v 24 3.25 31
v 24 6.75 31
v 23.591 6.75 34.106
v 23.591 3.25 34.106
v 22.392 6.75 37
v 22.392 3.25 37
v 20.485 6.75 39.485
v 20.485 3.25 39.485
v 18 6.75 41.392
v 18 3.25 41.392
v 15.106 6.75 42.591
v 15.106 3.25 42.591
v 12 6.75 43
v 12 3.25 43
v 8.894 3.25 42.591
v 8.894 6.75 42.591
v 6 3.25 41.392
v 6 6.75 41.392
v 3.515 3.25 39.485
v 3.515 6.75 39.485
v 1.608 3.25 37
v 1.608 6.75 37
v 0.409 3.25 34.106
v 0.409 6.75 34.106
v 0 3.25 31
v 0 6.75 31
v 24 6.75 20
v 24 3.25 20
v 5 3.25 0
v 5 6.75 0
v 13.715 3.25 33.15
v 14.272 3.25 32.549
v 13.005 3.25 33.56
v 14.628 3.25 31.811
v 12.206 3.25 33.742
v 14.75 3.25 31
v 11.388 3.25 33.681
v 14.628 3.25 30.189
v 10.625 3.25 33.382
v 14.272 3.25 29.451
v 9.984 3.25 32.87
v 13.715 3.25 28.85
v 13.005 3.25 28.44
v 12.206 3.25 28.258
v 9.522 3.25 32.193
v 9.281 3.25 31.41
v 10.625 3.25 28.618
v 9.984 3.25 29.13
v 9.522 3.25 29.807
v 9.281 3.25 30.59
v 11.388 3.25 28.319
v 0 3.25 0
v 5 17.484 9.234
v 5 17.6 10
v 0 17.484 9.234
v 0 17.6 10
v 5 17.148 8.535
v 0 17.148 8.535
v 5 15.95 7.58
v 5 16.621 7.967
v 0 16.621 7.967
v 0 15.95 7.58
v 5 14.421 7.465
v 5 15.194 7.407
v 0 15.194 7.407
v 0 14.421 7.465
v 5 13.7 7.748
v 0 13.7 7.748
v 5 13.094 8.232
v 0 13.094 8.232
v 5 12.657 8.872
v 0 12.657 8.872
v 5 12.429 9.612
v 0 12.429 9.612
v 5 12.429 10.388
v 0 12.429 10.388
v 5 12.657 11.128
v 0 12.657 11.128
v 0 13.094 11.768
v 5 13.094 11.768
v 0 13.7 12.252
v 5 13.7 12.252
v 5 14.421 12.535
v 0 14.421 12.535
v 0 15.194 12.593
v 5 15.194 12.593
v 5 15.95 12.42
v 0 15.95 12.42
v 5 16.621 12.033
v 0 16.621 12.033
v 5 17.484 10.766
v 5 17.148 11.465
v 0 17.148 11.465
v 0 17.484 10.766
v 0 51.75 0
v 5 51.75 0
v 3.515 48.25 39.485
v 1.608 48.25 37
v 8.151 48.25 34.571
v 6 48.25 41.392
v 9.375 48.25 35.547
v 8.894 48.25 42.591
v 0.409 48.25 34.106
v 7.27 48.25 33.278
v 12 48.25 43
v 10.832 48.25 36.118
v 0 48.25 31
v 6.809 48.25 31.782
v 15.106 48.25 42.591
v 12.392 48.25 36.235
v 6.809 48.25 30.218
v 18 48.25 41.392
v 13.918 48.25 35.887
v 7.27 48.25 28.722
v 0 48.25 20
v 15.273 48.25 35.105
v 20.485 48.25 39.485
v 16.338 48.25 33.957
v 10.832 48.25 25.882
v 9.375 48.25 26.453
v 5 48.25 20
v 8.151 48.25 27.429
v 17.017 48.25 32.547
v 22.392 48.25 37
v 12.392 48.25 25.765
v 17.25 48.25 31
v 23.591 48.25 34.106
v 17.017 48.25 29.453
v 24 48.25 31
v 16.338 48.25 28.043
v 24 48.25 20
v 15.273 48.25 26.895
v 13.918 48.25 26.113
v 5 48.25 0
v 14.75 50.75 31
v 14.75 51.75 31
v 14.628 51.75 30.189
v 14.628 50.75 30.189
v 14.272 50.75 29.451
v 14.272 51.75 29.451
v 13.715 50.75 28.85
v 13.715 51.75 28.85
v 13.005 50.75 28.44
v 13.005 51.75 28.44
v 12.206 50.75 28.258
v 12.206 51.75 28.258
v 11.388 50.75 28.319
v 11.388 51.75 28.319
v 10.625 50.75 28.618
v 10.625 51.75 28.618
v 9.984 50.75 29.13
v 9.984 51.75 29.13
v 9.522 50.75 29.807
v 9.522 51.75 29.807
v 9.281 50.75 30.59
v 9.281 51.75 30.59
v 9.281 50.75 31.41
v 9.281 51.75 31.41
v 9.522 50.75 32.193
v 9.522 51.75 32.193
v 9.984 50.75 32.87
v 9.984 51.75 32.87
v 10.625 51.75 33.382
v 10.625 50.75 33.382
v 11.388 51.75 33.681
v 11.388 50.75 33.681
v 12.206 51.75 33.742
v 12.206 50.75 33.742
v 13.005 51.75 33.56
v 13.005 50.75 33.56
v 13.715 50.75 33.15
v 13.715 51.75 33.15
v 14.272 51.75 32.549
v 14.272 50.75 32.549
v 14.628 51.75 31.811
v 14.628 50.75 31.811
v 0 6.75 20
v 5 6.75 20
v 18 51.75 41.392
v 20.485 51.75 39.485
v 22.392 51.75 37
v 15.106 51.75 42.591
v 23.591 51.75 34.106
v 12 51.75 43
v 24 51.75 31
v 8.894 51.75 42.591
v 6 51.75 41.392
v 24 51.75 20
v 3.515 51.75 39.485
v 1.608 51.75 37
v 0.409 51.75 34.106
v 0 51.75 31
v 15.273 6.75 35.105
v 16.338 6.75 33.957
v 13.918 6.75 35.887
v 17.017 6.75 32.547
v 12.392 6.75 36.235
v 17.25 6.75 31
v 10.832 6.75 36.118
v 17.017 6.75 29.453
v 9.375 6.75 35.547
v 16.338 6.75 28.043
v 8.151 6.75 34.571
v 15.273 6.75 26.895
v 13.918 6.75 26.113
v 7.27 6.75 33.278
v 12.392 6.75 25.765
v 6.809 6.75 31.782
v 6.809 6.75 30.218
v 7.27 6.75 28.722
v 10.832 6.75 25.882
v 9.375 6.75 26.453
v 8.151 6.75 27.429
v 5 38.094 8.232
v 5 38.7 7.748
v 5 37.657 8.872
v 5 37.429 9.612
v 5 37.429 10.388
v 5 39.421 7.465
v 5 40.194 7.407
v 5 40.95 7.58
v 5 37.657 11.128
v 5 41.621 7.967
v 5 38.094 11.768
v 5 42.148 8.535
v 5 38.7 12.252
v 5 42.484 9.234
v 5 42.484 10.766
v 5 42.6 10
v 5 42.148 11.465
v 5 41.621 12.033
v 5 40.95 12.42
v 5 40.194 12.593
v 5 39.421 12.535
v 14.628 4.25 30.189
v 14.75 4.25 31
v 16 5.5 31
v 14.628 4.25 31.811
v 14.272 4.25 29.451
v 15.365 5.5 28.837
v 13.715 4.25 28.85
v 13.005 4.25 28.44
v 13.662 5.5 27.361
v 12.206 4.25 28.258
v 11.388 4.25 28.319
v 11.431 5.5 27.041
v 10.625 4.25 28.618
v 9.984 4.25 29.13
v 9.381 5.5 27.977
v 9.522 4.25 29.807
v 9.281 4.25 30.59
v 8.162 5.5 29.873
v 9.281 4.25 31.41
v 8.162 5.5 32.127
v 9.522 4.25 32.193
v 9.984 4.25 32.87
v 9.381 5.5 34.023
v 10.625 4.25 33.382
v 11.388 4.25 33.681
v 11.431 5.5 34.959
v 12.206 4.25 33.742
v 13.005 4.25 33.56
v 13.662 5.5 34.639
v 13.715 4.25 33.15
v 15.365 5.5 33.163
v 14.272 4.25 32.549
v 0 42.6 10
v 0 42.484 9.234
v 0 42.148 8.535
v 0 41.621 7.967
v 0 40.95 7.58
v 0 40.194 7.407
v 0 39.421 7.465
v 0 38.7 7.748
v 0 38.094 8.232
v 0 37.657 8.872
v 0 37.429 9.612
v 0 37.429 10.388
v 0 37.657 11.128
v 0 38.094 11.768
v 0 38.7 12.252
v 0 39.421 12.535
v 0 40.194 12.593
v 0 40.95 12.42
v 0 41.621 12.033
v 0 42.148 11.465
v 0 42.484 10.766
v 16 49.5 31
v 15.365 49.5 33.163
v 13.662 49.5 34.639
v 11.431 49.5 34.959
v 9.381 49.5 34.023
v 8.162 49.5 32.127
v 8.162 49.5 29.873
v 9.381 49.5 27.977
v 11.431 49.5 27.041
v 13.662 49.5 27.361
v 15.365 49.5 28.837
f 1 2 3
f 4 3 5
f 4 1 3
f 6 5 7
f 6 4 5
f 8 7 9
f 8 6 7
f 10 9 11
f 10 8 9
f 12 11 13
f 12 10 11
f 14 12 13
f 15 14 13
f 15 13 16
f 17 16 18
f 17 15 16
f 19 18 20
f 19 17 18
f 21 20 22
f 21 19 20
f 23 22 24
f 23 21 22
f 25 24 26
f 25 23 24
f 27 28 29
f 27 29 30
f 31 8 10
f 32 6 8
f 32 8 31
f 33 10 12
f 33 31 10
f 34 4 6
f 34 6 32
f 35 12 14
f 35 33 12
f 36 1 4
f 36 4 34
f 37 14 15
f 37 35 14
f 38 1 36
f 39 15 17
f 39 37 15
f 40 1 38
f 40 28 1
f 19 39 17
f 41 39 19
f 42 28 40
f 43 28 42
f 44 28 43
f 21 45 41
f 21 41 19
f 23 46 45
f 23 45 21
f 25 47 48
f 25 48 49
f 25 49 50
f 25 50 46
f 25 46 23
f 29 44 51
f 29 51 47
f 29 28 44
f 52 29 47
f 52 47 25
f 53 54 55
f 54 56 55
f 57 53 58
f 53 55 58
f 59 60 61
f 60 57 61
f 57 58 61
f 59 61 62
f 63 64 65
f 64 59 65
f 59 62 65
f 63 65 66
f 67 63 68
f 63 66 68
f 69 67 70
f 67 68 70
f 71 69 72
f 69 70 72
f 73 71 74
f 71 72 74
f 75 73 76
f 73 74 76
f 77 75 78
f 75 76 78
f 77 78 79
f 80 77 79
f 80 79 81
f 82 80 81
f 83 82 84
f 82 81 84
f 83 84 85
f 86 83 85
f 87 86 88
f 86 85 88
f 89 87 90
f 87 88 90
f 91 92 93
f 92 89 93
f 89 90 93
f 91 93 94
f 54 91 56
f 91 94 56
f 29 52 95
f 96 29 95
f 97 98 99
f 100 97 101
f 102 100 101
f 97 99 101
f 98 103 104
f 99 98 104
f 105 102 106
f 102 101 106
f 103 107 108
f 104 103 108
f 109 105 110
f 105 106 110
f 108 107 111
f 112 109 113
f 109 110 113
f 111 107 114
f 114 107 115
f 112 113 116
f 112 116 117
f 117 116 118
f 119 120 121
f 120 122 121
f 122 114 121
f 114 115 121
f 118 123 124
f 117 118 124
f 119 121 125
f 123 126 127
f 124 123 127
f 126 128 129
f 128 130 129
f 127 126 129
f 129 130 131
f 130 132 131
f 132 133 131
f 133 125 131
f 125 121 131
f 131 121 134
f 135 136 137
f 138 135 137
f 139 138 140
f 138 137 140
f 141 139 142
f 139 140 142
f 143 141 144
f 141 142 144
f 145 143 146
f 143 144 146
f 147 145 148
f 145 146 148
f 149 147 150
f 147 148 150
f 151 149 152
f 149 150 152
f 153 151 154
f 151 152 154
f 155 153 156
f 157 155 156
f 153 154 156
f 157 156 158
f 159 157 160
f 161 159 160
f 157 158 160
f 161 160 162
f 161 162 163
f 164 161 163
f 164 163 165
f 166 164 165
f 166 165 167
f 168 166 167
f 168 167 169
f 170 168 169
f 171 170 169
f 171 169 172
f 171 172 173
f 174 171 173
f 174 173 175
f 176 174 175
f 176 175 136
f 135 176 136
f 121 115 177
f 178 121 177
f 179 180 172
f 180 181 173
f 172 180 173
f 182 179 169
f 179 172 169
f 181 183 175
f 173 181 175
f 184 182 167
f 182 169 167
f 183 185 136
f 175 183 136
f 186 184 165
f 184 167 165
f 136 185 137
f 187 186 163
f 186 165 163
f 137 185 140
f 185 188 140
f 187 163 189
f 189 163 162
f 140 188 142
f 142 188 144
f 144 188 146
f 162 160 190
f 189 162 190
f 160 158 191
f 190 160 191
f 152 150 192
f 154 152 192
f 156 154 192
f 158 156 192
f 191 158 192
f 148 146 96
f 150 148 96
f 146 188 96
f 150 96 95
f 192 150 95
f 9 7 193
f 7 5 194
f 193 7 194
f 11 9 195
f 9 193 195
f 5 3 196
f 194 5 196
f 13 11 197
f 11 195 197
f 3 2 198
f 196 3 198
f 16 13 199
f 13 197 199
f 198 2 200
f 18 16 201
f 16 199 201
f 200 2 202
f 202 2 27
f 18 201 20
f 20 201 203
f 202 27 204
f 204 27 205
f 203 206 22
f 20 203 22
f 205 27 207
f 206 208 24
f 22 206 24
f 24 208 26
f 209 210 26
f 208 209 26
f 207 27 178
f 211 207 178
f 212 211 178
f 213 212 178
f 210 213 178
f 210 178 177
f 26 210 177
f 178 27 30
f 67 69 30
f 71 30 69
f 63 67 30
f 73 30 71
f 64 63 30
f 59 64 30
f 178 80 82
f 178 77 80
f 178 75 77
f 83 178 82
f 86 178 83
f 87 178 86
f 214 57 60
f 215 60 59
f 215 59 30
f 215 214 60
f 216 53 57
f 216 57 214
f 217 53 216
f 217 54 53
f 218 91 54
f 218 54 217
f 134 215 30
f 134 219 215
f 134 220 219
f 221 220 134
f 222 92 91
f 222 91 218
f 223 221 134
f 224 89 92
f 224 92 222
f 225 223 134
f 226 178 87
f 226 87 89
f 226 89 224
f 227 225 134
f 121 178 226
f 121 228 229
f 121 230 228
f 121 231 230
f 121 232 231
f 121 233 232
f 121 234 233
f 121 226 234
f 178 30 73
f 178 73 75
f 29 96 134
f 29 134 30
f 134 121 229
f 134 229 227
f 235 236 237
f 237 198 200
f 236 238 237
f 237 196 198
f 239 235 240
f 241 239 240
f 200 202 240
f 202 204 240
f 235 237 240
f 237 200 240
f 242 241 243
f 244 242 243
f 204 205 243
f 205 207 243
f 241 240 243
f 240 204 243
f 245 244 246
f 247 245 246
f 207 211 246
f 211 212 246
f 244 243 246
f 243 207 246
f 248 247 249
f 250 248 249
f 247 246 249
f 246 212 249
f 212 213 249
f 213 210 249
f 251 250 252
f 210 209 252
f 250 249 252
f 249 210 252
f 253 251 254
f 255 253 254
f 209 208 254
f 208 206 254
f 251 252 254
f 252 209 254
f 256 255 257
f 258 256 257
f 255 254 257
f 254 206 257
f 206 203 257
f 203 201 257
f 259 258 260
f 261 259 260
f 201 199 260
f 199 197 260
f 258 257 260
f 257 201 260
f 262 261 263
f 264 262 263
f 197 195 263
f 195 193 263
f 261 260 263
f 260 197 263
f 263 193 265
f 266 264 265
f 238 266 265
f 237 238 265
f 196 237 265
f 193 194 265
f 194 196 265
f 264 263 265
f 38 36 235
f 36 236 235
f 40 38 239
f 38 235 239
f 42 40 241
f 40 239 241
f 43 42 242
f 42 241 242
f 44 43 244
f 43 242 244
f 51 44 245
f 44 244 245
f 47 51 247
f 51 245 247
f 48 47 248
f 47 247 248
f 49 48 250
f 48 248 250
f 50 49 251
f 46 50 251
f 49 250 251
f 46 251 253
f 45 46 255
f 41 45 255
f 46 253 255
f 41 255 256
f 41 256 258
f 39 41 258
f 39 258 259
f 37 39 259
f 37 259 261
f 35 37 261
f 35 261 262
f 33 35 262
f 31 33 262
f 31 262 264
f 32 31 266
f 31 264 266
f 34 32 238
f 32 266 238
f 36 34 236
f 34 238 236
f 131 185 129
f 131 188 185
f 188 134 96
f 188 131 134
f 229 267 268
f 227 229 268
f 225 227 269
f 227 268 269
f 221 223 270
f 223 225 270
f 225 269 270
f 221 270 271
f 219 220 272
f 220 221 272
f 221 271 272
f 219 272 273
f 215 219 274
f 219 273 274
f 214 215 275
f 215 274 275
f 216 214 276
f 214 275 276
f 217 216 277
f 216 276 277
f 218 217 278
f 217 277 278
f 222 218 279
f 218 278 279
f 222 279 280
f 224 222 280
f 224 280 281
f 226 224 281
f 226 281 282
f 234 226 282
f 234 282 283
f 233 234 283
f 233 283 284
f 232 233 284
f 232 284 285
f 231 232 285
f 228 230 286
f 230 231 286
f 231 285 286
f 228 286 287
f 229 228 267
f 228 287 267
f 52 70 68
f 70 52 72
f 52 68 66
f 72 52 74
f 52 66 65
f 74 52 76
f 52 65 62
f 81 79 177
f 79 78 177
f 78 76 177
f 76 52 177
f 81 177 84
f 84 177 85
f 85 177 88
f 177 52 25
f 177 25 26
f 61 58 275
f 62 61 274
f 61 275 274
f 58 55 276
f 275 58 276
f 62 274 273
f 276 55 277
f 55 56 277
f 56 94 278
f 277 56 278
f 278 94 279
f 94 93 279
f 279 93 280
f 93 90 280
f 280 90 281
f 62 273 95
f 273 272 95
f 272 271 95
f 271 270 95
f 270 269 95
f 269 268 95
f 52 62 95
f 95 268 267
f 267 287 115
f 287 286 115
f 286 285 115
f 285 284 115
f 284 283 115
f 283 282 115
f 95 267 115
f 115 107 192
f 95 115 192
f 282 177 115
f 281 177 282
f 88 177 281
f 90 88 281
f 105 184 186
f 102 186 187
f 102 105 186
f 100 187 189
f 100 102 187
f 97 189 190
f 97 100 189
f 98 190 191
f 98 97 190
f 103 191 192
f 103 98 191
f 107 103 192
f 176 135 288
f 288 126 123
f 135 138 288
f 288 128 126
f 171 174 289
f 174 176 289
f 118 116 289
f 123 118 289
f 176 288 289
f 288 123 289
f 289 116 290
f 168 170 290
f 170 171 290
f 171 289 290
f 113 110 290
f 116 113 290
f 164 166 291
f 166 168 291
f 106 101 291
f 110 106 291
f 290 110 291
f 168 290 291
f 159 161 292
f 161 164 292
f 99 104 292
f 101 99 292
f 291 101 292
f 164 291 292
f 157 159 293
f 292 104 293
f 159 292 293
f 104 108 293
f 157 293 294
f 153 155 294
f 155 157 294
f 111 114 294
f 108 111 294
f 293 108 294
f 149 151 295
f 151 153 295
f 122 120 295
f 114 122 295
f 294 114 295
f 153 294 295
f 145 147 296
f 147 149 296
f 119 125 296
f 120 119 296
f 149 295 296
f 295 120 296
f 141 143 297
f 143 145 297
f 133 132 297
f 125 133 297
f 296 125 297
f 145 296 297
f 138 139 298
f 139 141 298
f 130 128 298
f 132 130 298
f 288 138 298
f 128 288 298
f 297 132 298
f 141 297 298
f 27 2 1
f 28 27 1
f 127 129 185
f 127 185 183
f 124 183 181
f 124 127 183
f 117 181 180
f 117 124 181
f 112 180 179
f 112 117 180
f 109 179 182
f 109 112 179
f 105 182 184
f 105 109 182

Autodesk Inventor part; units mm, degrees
ref_plane "YZ Plane" through (0, 0, 0) normal (1, 0, 0) x (0, 1, 0)
ref_plane "XZ Plane" through (0, 0, 0) normal (0, 1, 0) x (-1, 0, 0)
ref_plane "XY Plane" through (0, 0, 0) normal (0, 0, 1) x (1, 0, 0)
sketch "Sketch1" plane through (0, 0, 0) normal (1, 0, 0) x (0, 1, 0)
  line L0 (0, 0) -> (55, 0)
  line L1 (55, 0) -> (55, 20)
  line L2 (55, 20) -> (0, 20)
  line L3 (0, 20) -> (0, 0)
  line L4 (55, 10) -> (0, 10) construction
  circle A0 centre (40, 10) radius 2.6
  circle A1 centre (15, 10) radius 2.6
  dimension "d0" = 55
  dimension "d1" = 20
  dimension "d2" = 5.2
  dimension "d3" = 5.2
  dimension "d4" = 15
  dimension "d5" = 15
extrude "Extrusion1" add sketch "Sketch1" along normal blind 5
sketch "Sketch2" plane through (0, 0, 20) normal (0, 0, 1) x (1, 0, 0)
  line L0 (0, 48.25) -> (29, 48.25)
  line L1 (29, 48.25) -> (29, 55)
  line L2 (29, 55) -> (0, 55)
  line L3 (0, 55) -> (0, 48.25)
  line L4 (0, 0) -> (29, 0)
  line L5 (29, 0) -> (29, 6.75)
  line L6 (29, 6.75) -> (0, 6.75)
  line L7 (0, 6.75) -> (0, 0)
  line L8 (0, 55) -> (5, 55) projected
  line L9 (0, 0) -> (0, 55) projected
  line L10 (0, 55) -> (0, 0) projected
  line L11 (0, 0) -> (5, 0) projected
  line L12 (5, 55) -> (5, 0) projected
  line L13 (0, 55) -> (5, 55) projected
  line L14 (29, 55) -> (24, 55)
  line L15 (24, 55) -> (24, 0)
  line L16 (24, 0) -> (29, 0)
  line L17 (29, 0) -> (29, 55)
  point P0 (5, 48.25)
  point P1 (5, 6.75)
  point P2 (24, 6.75)
  point P3 (24, 48.25)
  dimension "d8" = 29
  dimension "d9" = 29
  dimension "d12" = 6.75
  dimension "d13" = 41.5
  dimension "d33" = 5
extrude "Extrusion2" add sketch "Sketch2" along normal blind 23 contours L3 L2 L12 L0 | L12 L2 L15 L0 | L6 L12 L4 L7 | L6 L15 L4 L12
fillet "Fillet1" radius 12 4 edges at (24, 51.625, 43) (0, 51.625, 43) (24, 3.375, 43) (0, 3.375, 43)
sketch "Sketch3" plane through (0, 55, 0) normal (0, 1, 0) x (1, 0, 0)
  circle A0 centre (12, -31) radius 2.75
  arc A1 (0, -31) -> (24, -31) centre (12, -31) ccw projected
  point P0 (0, 0)
  dimension "d17" = 5.5
extrude "Extrusion3" cut sketch "Sketch3" against normal through all
sketch "Sketch4" plane through (0, 0, 0) normal (0, 0, -1) x (-1, 0, 0)
  line L0 (0, 55) -> (-5, 55) projected
  line L1 (0, 55) -> (-29, 55)
  line L2 (-29, 55) -> (-29, 51.75)
  line L3 (-29, 51.75) -> (0, 51.75)
  line L4 (0, 51.75) -> (0, 55)
  line L5 (0, 6.75) -> (0, 0) projected
  line L6 (-29, 0) -> (-29, 6.75) projected
  line L7 (0, 0) -> (-29, 0)
  line L8 (-29, 0) -> (-29, 3.25)
  line L9 (-29, 3.25) -> (0, 3.25)
  line L10 (0, 3.25) -> (0, 0)
  dimension "d26" = 3.25
  dimension "d27" = 3.25
extrude "Extrusion4" cut sketch "Sketch4" against normal through all
chamfer "Chamfer3" distance 2.5 angle 45 2 edges at (9.25, 48.25, 31) (9.25, 6.75, 31)
chamfer "Chamfer4" distance 20 distance2 19 1 edges at (5, 50, 20) measured on face at (5, 23.6407, 2.523)
chamfer "Chamfer5" distance 20 distance2 19 1 edges at (5, 5, 20) measured on face at (5, 22.474, 2.523)
equation "\"d3\" = d2"
equation "\"d5\" = d4"
equation "\"d9\" = d8"
properties part number "Y Axis Drag Chain Mount Bolted"
